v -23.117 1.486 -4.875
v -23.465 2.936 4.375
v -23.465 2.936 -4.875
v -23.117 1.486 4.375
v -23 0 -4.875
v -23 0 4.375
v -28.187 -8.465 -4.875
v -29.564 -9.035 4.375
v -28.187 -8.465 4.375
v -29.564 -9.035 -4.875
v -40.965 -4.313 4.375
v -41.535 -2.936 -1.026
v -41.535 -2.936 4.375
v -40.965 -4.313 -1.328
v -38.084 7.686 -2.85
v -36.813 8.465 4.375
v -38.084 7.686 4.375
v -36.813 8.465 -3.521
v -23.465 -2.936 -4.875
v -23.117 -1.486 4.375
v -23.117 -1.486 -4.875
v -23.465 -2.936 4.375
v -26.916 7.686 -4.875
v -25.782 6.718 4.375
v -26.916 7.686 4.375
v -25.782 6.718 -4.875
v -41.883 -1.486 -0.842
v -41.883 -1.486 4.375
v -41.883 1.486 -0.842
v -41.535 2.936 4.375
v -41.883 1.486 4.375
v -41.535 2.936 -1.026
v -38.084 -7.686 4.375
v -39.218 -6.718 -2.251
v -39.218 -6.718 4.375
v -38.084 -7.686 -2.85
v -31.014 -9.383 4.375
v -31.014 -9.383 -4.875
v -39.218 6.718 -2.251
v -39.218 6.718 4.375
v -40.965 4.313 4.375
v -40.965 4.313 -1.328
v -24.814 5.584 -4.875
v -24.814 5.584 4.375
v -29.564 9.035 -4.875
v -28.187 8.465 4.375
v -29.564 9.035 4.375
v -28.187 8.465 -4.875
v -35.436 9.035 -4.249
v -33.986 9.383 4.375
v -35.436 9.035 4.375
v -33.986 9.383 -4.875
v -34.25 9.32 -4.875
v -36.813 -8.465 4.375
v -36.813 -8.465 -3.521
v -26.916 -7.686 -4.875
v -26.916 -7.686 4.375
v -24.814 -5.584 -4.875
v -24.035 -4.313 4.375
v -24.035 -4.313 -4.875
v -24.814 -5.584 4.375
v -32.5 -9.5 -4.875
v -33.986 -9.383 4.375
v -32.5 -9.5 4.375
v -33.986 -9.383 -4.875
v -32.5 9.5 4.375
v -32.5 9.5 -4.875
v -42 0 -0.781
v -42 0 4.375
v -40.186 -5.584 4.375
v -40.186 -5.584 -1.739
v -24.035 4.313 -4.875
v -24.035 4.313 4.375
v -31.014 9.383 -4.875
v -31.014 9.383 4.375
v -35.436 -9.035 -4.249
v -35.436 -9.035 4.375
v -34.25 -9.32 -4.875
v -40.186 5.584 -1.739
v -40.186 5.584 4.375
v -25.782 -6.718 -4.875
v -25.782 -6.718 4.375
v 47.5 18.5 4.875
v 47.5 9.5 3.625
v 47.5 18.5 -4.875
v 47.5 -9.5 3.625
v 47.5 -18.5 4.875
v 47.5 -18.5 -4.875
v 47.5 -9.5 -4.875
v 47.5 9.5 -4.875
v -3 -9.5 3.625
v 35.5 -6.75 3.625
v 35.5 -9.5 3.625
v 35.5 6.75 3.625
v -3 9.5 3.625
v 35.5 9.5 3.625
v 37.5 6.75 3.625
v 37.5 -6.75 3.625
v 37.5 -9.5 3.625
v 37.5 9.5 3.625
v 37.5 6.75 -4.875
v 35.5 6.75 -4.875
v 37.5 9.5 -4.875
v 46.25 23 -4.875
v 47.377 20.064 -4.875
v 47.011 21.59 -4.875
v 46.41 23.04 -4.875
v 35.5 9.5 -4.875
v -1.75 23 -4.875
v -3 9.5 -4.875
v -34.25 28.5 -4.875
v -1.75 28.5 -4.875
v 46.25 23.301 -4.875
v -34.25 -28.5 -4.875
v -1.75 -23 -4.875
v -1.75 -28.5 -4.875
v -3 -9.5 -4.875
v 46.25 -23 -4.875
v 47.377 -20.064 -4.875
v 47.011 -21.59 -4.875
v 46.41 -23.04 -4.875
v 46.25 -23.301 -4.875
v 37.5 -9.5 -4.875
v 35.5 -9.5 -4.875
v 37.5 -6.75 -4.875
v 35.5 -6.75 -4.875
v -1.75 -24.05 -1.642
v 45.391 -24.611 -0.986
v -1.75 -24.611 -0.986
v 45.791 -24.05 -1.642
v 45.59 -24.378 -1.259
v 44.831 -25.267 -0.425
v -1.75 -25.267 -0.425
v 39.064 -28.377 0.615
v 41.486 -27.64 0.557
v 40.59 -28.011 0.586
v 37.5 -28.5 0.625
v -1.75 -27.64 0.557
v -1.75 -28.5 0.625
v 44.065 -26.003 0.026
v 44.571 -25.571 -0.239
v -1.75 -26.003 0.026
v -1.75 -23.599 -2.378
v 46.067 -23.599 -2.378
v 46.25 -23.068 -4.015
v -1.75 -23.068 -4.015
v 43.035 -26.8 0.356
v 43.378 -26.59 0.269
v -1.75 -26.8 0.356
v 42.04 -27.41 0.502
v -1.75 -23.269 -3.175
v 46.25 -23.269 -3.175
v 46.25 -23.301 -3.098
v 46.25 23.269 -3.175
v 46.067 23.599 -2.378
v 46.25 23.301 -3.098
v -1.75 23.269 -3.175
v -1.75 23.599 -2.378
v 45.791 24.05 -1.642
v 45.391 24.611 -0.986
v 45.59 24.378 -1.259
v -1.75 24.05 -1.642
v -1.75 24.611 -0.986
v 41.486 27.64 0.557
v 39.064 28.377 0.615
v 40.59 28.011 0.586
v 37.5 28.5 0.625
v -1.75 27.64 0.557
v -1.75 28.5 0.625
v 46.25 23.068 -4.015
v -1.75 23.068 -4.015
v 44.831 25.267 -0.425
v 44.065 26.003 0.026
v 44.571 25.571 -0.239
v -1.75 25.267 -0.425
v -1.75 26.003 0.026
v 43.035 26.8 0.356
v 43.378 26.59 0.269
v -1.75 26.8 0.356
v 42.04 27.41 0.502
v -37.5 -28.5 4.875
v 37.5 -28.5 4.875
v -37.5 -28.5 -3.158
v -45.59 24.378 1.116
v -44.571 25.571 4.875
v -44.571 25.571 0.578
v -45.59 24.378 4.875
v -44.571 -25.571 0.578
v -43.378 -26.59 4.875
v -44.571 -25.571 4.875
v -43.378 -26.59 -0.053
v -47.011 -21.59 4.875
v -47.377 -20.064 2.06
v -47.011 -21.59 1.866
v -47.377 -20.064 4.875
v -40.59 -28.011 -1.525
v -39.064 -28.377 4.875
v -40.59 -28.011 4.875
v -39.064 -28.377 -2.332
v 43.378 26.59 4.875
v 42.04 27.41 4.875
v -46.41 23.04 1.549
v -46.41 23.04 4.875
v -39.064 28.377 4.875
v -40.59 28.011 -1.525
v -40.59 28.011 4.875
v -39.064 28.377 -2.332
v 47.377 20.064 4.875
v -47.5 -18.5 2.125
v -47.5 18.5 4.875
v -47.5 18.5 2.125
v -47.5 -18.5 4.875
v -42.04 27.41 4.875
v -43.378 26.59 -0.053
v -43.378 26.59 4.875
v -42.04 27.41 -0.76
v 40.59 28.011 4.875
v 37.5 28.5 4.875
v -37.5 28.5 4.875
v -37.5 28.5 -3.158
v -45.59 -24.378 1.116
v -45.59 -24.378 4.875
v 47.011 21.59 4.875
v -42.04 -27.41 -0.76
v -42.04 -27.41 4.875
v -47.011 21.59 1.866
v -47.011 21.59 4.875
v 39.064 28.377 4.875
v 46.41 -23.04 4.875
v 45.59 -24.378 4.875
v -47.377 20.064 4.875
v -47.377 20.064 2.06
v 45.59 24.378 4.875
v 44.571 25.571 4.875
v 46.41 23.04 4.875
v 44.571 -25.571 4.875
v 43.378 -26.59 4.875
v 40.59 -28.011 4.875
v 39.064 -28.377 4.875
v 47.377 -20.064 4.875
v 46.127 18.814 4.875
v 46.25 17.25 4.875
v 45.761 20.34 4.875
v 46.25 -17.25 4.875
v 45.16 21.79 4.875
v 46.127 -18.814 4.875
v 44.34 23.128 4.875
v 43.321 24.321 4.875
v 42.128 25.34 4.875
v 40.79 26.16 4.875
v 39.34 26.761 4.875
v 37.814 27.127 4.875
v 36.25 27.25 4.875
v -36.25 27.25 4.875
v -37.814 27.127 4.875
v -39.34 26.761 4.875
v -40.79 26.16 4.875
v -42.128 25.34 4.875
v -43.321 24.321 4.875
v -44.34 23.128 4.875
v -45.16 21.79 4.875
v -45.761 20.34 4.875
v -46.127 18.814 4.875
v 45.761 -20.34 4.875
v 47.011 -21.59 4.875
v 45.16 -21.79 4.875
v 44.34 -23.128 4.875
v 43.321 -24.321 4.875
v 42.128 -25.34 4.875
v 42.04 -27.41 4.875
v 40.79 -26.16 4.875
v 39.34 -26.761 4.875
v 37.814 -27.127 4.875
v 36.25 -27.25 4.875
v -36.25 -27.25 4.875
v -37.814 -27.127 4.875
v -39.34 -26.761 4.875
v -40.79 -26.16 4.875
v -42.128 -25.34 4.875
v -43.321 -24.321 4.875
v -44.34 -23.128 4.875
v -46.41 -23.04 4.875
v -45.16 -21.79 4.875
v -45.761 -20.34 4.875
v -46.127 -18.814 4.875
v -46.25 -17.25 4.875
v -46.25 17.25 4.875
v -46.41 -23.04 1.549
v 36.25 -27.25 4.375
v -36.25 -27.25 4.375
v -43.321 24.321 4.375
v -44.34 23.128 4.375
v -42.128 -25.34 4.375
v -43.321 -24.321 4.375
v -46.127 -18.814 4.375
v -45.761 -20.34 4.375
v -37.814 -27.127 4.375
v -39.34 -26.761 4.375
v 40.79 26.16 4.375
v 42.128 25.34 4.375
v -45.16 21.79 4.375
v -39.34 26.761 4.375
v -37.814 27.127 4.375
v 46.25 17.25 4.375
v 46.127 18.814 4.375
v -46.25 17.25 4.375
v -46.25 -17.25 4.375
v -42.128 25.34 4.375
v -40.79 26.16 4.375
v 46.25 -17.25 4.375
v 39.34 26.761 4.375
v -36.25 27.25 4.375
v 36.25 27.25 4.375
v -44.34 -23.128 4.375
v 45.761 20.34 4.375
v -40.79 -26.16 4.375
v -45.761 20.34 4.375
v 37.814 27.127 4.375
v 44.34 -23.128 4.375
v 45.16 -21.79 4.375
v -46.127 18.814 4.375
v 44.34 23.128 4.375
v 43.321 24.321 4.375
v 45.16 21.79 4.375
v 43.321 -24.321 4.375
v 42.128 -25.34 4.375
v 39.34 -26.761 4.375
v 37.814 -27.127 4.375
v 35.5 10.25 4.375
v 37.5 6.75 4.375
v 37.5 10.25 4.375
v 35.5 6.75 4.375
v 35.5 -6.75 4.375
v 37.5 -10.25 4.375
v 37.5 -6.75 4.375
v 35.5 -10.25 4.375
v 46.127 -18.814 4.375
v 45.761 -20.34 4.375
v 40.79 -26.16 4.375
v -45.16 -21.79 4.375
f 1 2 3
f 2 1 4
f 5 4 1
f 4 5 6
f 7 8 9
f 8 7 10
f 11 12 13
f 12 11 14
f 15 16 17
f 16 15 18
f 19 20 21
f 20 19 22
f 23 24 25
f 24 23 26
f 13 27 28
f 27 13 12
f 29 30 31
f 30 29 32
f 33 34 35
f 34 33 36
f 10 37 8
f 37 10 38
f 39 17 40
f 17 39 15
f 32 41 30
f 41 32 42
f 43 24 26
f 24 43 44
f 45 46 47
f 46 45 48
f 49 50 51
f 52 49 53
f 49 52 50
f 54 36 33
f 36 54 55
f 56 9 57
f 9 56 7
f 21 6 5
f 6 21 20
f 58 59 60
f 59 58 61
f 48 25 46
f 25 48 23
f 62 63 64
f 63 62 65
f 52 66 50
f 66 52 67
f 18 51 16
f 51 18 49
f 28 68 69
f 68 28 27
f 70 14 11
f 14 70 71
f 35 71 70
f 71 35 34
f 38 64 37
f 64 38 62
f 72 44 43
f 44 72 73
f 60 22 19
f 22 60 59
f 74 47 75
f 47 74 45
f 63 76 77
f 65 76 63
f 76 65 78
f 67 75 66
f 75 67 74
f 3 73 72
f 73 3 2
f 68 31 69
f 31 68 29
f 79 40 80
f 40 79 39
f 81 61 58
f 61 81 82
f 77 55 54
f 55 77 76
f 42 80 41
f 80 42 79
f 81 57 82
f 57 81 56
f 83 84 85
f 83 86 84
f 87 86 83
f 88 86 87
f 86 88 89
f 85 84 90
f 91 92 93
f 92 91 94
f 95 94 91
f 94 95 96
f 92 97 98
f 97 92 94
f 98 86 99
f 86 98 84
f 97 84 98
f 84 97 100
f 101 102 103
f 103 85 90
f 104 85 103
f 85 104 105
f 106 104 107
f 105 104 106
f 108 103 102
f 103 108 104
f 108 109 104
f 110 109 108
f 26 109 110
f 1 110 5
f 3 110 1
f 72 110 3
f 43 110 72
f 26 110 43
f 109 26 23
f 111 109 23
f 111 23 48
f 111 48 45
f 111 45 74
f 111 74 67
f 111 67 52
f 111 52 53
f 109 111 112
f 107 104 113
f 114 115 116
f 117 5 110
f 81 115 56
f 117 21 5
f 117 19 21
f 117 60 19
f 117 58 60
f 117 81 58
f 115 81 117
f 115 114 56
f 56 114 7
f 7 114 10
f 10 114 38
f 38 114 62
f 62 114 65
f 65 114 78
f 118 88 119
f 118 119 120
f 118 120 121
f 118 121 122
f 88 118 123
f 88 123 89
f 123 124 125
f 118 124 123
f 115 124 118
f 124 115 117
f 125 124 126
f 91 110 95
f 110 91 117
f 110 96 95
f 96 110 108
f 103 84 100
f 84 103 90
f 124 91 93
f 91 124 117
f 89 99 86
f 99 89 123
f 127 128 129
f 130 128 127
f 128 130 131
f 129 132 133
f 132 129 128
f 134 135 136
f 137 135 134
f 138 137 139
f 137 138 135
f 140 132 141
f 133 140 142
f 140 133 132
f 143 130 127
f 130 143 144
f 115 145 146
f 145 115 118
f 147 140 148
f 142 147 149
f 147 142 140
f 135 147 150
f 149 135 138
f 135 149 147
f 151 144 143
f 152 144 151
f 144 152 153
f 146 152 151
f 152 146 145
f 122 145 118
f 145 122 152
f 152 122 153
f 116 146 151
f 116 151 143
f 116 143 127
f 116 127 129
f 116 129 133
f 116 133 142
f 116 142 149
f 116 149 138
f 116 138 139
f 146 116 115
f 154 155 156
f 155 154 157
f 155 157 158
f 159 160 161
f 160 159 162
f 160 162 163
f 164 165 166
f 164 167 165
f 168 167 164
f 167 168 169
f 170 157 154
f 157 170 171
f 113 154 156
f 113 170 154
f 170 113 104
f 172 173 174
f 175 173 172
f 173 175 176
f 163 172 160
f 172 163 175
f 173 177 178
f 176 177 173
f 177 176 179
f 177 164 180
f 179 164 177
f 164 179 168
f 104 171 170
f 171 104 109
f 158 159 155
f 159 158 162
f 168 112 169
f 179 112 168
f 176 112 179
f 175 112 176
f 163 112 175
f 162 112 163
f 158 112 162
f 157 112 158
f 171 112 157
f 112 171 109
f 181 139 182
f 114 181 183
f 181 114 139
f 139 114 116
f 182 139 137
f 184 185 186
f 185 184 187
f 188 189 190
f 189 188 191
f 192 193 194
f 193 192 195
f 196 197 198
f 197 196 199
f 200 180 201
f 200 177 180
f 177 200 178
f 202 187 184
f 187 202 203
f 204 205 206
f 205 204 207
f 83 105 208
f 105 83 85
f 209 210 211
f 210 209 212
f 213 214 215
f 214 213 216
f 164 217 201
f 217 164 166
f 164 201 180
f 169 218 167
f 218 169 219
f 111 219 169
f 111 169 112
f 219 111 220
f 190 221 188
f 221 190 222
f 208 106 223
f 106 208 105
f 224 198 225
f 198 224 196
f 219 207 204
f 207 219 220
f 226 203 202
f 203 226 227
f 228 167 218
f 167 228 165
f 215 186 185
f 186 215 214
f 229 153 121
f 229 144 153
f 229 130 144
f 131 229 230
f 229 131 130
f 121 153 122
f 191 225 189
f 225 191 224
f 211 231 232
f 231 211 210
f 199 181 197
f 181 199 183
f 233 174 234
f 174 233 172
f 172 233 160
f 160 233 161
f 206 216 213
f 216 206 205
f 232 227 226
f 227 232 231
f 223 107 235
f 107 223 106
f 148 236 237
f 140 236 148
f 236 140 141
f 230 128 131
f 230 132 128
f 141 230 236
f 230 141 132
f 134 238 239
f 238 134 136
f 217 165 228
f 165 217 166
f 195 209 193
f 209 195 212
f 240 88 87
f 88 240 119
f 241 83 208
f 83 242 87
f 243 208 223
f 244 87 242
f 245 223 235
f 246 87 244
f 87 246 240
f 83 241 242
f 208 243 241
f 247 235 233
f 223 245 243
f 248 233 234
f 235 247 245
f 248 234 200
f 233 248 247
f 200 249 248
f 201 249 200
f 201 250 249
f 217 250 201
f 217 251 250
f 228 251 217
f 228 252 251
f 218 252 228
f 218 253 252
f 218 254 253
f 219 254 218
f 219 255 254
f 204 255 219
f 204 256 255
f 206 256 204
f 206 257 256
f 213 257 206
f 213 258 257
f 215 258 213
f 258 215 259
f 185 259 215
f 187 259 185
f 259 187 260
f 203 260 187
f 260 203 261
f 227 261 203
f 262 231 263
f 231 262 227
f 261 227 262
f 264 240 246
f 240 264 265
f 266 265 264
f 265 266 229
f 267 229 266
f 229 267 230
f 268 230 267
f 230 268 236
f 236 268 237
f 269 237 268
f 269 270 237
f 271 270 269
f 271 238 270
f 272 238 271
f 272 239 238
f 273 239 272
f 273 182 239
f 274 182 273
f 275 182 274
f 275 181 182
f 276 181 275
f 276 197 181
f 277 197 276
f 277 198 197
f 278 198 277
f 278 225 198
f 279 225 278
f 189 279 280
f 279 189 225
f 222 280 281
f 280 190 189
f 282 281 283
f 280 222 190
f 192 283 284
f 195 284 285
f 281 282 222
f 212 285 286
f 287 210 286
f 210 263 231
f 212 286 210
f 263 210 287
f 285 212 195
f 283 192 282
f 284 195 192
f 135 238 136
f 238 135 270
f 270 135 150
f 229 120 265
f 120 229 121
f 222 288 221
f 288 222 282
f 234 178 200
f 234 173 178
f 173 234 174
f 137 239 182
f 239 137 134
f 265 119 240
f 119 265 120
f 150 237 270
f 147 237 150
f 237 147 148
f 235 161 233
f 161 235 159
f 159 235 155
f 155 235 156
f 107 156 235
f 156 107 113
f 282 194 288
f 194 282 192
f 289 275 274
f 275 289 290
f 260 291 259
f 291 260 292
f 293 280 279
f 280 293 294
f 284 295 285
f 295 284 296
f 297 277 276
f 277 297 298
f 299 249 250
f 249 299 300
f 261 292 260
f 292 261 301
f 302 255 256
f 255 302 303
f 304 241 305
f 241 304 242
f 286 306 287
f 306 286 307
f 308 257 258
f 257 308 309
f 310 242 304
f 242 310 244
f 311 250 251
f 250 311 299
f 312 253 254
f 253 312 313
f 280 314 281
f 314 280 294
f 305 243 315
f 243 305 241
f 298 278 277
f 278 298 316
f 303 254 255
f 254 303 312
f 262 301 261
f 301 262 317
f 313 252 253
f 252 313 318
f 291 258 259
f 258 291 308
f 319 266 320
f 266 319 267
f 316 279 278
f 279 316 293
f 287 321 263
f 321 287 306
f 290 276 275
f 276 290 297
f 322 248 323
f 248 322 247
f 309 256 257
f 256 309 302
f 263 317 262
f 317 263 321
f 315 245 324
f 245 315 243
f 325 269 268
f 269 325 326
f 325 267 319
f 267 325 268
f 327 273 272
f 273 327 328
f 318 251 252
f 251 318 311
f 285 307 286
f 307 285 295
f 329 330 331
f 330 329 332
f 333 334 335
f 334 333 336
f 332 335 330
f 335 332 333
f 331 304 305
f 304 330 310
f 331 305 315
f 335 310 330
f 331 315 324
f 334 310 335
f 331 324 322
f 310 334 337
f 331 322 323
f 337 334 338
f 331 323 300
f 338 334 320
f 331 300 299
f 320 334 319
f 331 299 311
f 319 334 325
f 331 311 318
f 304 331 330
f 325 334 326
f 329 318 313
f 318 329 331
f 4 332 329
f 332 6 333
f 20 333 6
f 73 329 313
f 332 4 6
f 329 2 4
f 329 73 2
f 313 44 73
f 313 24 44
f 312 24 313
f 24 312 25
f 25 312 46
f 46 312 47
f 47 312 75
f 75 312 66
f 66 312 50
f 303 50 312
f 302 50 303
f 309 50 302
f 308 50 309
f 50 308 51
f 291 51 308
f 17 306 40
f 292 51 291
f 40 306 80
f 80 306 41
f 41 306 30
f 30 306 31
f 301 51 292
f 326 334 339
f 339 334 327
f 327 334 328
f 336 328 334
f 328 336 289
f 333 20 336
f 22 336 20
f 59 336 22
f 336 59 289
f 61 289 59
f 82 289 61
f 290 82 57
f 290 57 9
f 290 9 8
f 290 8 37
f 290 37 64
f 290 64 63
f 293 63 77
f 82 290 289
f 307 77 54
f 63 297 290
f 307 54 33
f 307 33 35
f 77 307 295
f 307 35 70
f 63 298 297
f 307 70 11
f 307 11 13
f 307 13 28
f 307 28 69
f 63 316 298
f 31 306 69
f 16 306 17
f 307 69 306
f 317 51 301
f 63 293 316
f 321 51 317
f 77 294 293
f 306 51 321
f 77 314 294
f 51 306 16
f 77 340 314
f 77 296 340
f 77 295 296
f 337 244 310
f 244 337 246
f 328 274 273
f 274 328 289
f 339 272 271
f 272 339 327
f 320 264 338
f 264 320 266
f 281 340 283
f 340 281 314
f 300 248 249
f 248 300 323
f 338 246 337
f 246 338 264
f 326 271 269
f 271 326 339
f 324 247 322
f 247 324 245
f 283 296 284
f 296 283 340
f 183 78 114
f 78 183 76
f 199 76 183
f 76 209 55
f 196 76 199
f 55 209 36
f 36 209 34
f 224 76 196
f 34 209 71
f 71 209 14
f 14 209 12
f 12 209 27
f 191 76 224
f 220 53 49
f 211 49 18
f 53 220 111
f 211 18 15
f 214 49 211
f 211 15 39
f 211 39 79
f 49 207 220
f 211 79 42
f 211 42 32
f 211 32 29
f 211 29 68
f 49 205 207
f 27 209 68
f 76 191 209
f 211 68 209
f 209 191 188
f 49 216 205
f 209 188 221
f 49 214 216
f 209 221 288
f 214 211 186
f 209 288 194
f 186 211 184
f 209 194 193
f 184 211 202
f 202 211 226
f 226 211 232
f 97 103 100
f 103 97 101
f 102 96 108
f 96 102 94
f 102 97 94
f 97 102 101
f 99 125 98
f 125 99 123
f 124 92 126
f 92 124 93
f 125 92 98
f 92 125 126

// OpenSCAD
//Author: Chris Correll
//Date: 9/5/2022
//Description: Joy Player replacement cartridge for easy flash drive swabbing

include <MCAD/3d_triangle.scad>

$fn = 40;
e=.01;

//cartridge
x = 95;
y = 57;
z = 9.75;
hole_r = 19/2;
hole_off = 5.5; //5.25 changed
hole_h = z+e;
lip_off_x = 2.5;
lip_off_y = 2.5;
lip_off_z = .5;//from .5

//guide slots
slot_length = 48; 
slot_r = 5.5;

//cut out for flash drive
cut_x = 50.5;
cut_y = 19;
cut_z = 8.5;  //from 8.75 
cut_hole_r = 9.5/2;
cut_hole_h = 8.75;
cut_hole_off = 15.25; 
//cut_off_x =
//cut_off_y
//cut_off_z = 1; //3.3 from top of cartridge to flash drive 2 from case outer to flash drive and 2.5 from cut out to top of cartridge so 4.5-3.3 offset need
drive_off_x = 12;
drive_off_y = 3.5;
drive_off_thick = 2;

module right_triangle(a,b,h){
    linear_extrude(h){
    polygon(points = [ [a, 0], [0,b], [a,b]],  convexity = 1);
}
}

module rounded_cube(w,l,z,rad1,rad2){
    hull(){
        translate([(w)/2-rad1,(l)/2-rad1,0])
        cylinder(h = z, r = rad1, center = true);
        translate([-((w)/2-rad2),-((l)/2-rad2),0])
        cylinder(h = z, r = rad2, center = true);
        translate([-((w)/2-rad1),(l)/2-rad1,0])
        cylinder(h = z, r = rad1, center = true);
        translate([(w)/2-rad2,-((l)/2-rad2),0])
        cylinder(h = z, r = rad2, center = true);  
    };
}

//stops for flash drive
union(){
translate([x/2+drive_off_thick/2-drive_off_x,drive_off_x-drive_off_y,-lip_off_z/2])
cube([drive_off_thick, drive_off_y, z-lip_off_z],center=true);
translate([x/2+drive_off_thick/2-drive_off_x,-drive_off_x+drive_off_y,-lip_off_z/2])
cube([drive_off_thick, drive_off_y, z-lip_off_z],center=true);

//cartridge
difference(){
//main cartridge with ridge
rounded_cube(x,y,z,10,10);
translate([0,0,z-lip_off_z])
rounded_cube(x-lip_off_x,y-lip_off_y,z,10,10);

union(){
//holder hole
translate([-x/2+hole_r+hole_off,0,0])
cylinder(r = hole_r, h = hole_h, center=true);

//flash drive slot
translate([x/2-cut_x/2,0,-z/2+cut_z/2])
cube([cut_x,cut_y,cut_z],center=true);

//hole change cut_z to 7.5 
//translate([cut_hole_off,0,-z/2+cut_hole_h/2])
//#cylinder(r = cut_hole_r, h = cut_hole_h, center=true);

//guide slots
translate([x/2-cut_x/2,-y/2,-z/2])
rotate([0,90,0])
cylinder(r=slot_r,h=slot_length,center=true);
translate([x/2-cut_x/2,y/2,-z/2])
rotate([0,90,0])
cylinder(r=slot_r,h=slot_length,center=true);
}

//angeled back
b = 13.25;
a = 7;
translate([b-x/2,-y/2,a-z/2])
//translate([b/2,-y/2,z/2-a/2])
rotate([90,90,180])
right_triangle(a,b,y);
}
}
